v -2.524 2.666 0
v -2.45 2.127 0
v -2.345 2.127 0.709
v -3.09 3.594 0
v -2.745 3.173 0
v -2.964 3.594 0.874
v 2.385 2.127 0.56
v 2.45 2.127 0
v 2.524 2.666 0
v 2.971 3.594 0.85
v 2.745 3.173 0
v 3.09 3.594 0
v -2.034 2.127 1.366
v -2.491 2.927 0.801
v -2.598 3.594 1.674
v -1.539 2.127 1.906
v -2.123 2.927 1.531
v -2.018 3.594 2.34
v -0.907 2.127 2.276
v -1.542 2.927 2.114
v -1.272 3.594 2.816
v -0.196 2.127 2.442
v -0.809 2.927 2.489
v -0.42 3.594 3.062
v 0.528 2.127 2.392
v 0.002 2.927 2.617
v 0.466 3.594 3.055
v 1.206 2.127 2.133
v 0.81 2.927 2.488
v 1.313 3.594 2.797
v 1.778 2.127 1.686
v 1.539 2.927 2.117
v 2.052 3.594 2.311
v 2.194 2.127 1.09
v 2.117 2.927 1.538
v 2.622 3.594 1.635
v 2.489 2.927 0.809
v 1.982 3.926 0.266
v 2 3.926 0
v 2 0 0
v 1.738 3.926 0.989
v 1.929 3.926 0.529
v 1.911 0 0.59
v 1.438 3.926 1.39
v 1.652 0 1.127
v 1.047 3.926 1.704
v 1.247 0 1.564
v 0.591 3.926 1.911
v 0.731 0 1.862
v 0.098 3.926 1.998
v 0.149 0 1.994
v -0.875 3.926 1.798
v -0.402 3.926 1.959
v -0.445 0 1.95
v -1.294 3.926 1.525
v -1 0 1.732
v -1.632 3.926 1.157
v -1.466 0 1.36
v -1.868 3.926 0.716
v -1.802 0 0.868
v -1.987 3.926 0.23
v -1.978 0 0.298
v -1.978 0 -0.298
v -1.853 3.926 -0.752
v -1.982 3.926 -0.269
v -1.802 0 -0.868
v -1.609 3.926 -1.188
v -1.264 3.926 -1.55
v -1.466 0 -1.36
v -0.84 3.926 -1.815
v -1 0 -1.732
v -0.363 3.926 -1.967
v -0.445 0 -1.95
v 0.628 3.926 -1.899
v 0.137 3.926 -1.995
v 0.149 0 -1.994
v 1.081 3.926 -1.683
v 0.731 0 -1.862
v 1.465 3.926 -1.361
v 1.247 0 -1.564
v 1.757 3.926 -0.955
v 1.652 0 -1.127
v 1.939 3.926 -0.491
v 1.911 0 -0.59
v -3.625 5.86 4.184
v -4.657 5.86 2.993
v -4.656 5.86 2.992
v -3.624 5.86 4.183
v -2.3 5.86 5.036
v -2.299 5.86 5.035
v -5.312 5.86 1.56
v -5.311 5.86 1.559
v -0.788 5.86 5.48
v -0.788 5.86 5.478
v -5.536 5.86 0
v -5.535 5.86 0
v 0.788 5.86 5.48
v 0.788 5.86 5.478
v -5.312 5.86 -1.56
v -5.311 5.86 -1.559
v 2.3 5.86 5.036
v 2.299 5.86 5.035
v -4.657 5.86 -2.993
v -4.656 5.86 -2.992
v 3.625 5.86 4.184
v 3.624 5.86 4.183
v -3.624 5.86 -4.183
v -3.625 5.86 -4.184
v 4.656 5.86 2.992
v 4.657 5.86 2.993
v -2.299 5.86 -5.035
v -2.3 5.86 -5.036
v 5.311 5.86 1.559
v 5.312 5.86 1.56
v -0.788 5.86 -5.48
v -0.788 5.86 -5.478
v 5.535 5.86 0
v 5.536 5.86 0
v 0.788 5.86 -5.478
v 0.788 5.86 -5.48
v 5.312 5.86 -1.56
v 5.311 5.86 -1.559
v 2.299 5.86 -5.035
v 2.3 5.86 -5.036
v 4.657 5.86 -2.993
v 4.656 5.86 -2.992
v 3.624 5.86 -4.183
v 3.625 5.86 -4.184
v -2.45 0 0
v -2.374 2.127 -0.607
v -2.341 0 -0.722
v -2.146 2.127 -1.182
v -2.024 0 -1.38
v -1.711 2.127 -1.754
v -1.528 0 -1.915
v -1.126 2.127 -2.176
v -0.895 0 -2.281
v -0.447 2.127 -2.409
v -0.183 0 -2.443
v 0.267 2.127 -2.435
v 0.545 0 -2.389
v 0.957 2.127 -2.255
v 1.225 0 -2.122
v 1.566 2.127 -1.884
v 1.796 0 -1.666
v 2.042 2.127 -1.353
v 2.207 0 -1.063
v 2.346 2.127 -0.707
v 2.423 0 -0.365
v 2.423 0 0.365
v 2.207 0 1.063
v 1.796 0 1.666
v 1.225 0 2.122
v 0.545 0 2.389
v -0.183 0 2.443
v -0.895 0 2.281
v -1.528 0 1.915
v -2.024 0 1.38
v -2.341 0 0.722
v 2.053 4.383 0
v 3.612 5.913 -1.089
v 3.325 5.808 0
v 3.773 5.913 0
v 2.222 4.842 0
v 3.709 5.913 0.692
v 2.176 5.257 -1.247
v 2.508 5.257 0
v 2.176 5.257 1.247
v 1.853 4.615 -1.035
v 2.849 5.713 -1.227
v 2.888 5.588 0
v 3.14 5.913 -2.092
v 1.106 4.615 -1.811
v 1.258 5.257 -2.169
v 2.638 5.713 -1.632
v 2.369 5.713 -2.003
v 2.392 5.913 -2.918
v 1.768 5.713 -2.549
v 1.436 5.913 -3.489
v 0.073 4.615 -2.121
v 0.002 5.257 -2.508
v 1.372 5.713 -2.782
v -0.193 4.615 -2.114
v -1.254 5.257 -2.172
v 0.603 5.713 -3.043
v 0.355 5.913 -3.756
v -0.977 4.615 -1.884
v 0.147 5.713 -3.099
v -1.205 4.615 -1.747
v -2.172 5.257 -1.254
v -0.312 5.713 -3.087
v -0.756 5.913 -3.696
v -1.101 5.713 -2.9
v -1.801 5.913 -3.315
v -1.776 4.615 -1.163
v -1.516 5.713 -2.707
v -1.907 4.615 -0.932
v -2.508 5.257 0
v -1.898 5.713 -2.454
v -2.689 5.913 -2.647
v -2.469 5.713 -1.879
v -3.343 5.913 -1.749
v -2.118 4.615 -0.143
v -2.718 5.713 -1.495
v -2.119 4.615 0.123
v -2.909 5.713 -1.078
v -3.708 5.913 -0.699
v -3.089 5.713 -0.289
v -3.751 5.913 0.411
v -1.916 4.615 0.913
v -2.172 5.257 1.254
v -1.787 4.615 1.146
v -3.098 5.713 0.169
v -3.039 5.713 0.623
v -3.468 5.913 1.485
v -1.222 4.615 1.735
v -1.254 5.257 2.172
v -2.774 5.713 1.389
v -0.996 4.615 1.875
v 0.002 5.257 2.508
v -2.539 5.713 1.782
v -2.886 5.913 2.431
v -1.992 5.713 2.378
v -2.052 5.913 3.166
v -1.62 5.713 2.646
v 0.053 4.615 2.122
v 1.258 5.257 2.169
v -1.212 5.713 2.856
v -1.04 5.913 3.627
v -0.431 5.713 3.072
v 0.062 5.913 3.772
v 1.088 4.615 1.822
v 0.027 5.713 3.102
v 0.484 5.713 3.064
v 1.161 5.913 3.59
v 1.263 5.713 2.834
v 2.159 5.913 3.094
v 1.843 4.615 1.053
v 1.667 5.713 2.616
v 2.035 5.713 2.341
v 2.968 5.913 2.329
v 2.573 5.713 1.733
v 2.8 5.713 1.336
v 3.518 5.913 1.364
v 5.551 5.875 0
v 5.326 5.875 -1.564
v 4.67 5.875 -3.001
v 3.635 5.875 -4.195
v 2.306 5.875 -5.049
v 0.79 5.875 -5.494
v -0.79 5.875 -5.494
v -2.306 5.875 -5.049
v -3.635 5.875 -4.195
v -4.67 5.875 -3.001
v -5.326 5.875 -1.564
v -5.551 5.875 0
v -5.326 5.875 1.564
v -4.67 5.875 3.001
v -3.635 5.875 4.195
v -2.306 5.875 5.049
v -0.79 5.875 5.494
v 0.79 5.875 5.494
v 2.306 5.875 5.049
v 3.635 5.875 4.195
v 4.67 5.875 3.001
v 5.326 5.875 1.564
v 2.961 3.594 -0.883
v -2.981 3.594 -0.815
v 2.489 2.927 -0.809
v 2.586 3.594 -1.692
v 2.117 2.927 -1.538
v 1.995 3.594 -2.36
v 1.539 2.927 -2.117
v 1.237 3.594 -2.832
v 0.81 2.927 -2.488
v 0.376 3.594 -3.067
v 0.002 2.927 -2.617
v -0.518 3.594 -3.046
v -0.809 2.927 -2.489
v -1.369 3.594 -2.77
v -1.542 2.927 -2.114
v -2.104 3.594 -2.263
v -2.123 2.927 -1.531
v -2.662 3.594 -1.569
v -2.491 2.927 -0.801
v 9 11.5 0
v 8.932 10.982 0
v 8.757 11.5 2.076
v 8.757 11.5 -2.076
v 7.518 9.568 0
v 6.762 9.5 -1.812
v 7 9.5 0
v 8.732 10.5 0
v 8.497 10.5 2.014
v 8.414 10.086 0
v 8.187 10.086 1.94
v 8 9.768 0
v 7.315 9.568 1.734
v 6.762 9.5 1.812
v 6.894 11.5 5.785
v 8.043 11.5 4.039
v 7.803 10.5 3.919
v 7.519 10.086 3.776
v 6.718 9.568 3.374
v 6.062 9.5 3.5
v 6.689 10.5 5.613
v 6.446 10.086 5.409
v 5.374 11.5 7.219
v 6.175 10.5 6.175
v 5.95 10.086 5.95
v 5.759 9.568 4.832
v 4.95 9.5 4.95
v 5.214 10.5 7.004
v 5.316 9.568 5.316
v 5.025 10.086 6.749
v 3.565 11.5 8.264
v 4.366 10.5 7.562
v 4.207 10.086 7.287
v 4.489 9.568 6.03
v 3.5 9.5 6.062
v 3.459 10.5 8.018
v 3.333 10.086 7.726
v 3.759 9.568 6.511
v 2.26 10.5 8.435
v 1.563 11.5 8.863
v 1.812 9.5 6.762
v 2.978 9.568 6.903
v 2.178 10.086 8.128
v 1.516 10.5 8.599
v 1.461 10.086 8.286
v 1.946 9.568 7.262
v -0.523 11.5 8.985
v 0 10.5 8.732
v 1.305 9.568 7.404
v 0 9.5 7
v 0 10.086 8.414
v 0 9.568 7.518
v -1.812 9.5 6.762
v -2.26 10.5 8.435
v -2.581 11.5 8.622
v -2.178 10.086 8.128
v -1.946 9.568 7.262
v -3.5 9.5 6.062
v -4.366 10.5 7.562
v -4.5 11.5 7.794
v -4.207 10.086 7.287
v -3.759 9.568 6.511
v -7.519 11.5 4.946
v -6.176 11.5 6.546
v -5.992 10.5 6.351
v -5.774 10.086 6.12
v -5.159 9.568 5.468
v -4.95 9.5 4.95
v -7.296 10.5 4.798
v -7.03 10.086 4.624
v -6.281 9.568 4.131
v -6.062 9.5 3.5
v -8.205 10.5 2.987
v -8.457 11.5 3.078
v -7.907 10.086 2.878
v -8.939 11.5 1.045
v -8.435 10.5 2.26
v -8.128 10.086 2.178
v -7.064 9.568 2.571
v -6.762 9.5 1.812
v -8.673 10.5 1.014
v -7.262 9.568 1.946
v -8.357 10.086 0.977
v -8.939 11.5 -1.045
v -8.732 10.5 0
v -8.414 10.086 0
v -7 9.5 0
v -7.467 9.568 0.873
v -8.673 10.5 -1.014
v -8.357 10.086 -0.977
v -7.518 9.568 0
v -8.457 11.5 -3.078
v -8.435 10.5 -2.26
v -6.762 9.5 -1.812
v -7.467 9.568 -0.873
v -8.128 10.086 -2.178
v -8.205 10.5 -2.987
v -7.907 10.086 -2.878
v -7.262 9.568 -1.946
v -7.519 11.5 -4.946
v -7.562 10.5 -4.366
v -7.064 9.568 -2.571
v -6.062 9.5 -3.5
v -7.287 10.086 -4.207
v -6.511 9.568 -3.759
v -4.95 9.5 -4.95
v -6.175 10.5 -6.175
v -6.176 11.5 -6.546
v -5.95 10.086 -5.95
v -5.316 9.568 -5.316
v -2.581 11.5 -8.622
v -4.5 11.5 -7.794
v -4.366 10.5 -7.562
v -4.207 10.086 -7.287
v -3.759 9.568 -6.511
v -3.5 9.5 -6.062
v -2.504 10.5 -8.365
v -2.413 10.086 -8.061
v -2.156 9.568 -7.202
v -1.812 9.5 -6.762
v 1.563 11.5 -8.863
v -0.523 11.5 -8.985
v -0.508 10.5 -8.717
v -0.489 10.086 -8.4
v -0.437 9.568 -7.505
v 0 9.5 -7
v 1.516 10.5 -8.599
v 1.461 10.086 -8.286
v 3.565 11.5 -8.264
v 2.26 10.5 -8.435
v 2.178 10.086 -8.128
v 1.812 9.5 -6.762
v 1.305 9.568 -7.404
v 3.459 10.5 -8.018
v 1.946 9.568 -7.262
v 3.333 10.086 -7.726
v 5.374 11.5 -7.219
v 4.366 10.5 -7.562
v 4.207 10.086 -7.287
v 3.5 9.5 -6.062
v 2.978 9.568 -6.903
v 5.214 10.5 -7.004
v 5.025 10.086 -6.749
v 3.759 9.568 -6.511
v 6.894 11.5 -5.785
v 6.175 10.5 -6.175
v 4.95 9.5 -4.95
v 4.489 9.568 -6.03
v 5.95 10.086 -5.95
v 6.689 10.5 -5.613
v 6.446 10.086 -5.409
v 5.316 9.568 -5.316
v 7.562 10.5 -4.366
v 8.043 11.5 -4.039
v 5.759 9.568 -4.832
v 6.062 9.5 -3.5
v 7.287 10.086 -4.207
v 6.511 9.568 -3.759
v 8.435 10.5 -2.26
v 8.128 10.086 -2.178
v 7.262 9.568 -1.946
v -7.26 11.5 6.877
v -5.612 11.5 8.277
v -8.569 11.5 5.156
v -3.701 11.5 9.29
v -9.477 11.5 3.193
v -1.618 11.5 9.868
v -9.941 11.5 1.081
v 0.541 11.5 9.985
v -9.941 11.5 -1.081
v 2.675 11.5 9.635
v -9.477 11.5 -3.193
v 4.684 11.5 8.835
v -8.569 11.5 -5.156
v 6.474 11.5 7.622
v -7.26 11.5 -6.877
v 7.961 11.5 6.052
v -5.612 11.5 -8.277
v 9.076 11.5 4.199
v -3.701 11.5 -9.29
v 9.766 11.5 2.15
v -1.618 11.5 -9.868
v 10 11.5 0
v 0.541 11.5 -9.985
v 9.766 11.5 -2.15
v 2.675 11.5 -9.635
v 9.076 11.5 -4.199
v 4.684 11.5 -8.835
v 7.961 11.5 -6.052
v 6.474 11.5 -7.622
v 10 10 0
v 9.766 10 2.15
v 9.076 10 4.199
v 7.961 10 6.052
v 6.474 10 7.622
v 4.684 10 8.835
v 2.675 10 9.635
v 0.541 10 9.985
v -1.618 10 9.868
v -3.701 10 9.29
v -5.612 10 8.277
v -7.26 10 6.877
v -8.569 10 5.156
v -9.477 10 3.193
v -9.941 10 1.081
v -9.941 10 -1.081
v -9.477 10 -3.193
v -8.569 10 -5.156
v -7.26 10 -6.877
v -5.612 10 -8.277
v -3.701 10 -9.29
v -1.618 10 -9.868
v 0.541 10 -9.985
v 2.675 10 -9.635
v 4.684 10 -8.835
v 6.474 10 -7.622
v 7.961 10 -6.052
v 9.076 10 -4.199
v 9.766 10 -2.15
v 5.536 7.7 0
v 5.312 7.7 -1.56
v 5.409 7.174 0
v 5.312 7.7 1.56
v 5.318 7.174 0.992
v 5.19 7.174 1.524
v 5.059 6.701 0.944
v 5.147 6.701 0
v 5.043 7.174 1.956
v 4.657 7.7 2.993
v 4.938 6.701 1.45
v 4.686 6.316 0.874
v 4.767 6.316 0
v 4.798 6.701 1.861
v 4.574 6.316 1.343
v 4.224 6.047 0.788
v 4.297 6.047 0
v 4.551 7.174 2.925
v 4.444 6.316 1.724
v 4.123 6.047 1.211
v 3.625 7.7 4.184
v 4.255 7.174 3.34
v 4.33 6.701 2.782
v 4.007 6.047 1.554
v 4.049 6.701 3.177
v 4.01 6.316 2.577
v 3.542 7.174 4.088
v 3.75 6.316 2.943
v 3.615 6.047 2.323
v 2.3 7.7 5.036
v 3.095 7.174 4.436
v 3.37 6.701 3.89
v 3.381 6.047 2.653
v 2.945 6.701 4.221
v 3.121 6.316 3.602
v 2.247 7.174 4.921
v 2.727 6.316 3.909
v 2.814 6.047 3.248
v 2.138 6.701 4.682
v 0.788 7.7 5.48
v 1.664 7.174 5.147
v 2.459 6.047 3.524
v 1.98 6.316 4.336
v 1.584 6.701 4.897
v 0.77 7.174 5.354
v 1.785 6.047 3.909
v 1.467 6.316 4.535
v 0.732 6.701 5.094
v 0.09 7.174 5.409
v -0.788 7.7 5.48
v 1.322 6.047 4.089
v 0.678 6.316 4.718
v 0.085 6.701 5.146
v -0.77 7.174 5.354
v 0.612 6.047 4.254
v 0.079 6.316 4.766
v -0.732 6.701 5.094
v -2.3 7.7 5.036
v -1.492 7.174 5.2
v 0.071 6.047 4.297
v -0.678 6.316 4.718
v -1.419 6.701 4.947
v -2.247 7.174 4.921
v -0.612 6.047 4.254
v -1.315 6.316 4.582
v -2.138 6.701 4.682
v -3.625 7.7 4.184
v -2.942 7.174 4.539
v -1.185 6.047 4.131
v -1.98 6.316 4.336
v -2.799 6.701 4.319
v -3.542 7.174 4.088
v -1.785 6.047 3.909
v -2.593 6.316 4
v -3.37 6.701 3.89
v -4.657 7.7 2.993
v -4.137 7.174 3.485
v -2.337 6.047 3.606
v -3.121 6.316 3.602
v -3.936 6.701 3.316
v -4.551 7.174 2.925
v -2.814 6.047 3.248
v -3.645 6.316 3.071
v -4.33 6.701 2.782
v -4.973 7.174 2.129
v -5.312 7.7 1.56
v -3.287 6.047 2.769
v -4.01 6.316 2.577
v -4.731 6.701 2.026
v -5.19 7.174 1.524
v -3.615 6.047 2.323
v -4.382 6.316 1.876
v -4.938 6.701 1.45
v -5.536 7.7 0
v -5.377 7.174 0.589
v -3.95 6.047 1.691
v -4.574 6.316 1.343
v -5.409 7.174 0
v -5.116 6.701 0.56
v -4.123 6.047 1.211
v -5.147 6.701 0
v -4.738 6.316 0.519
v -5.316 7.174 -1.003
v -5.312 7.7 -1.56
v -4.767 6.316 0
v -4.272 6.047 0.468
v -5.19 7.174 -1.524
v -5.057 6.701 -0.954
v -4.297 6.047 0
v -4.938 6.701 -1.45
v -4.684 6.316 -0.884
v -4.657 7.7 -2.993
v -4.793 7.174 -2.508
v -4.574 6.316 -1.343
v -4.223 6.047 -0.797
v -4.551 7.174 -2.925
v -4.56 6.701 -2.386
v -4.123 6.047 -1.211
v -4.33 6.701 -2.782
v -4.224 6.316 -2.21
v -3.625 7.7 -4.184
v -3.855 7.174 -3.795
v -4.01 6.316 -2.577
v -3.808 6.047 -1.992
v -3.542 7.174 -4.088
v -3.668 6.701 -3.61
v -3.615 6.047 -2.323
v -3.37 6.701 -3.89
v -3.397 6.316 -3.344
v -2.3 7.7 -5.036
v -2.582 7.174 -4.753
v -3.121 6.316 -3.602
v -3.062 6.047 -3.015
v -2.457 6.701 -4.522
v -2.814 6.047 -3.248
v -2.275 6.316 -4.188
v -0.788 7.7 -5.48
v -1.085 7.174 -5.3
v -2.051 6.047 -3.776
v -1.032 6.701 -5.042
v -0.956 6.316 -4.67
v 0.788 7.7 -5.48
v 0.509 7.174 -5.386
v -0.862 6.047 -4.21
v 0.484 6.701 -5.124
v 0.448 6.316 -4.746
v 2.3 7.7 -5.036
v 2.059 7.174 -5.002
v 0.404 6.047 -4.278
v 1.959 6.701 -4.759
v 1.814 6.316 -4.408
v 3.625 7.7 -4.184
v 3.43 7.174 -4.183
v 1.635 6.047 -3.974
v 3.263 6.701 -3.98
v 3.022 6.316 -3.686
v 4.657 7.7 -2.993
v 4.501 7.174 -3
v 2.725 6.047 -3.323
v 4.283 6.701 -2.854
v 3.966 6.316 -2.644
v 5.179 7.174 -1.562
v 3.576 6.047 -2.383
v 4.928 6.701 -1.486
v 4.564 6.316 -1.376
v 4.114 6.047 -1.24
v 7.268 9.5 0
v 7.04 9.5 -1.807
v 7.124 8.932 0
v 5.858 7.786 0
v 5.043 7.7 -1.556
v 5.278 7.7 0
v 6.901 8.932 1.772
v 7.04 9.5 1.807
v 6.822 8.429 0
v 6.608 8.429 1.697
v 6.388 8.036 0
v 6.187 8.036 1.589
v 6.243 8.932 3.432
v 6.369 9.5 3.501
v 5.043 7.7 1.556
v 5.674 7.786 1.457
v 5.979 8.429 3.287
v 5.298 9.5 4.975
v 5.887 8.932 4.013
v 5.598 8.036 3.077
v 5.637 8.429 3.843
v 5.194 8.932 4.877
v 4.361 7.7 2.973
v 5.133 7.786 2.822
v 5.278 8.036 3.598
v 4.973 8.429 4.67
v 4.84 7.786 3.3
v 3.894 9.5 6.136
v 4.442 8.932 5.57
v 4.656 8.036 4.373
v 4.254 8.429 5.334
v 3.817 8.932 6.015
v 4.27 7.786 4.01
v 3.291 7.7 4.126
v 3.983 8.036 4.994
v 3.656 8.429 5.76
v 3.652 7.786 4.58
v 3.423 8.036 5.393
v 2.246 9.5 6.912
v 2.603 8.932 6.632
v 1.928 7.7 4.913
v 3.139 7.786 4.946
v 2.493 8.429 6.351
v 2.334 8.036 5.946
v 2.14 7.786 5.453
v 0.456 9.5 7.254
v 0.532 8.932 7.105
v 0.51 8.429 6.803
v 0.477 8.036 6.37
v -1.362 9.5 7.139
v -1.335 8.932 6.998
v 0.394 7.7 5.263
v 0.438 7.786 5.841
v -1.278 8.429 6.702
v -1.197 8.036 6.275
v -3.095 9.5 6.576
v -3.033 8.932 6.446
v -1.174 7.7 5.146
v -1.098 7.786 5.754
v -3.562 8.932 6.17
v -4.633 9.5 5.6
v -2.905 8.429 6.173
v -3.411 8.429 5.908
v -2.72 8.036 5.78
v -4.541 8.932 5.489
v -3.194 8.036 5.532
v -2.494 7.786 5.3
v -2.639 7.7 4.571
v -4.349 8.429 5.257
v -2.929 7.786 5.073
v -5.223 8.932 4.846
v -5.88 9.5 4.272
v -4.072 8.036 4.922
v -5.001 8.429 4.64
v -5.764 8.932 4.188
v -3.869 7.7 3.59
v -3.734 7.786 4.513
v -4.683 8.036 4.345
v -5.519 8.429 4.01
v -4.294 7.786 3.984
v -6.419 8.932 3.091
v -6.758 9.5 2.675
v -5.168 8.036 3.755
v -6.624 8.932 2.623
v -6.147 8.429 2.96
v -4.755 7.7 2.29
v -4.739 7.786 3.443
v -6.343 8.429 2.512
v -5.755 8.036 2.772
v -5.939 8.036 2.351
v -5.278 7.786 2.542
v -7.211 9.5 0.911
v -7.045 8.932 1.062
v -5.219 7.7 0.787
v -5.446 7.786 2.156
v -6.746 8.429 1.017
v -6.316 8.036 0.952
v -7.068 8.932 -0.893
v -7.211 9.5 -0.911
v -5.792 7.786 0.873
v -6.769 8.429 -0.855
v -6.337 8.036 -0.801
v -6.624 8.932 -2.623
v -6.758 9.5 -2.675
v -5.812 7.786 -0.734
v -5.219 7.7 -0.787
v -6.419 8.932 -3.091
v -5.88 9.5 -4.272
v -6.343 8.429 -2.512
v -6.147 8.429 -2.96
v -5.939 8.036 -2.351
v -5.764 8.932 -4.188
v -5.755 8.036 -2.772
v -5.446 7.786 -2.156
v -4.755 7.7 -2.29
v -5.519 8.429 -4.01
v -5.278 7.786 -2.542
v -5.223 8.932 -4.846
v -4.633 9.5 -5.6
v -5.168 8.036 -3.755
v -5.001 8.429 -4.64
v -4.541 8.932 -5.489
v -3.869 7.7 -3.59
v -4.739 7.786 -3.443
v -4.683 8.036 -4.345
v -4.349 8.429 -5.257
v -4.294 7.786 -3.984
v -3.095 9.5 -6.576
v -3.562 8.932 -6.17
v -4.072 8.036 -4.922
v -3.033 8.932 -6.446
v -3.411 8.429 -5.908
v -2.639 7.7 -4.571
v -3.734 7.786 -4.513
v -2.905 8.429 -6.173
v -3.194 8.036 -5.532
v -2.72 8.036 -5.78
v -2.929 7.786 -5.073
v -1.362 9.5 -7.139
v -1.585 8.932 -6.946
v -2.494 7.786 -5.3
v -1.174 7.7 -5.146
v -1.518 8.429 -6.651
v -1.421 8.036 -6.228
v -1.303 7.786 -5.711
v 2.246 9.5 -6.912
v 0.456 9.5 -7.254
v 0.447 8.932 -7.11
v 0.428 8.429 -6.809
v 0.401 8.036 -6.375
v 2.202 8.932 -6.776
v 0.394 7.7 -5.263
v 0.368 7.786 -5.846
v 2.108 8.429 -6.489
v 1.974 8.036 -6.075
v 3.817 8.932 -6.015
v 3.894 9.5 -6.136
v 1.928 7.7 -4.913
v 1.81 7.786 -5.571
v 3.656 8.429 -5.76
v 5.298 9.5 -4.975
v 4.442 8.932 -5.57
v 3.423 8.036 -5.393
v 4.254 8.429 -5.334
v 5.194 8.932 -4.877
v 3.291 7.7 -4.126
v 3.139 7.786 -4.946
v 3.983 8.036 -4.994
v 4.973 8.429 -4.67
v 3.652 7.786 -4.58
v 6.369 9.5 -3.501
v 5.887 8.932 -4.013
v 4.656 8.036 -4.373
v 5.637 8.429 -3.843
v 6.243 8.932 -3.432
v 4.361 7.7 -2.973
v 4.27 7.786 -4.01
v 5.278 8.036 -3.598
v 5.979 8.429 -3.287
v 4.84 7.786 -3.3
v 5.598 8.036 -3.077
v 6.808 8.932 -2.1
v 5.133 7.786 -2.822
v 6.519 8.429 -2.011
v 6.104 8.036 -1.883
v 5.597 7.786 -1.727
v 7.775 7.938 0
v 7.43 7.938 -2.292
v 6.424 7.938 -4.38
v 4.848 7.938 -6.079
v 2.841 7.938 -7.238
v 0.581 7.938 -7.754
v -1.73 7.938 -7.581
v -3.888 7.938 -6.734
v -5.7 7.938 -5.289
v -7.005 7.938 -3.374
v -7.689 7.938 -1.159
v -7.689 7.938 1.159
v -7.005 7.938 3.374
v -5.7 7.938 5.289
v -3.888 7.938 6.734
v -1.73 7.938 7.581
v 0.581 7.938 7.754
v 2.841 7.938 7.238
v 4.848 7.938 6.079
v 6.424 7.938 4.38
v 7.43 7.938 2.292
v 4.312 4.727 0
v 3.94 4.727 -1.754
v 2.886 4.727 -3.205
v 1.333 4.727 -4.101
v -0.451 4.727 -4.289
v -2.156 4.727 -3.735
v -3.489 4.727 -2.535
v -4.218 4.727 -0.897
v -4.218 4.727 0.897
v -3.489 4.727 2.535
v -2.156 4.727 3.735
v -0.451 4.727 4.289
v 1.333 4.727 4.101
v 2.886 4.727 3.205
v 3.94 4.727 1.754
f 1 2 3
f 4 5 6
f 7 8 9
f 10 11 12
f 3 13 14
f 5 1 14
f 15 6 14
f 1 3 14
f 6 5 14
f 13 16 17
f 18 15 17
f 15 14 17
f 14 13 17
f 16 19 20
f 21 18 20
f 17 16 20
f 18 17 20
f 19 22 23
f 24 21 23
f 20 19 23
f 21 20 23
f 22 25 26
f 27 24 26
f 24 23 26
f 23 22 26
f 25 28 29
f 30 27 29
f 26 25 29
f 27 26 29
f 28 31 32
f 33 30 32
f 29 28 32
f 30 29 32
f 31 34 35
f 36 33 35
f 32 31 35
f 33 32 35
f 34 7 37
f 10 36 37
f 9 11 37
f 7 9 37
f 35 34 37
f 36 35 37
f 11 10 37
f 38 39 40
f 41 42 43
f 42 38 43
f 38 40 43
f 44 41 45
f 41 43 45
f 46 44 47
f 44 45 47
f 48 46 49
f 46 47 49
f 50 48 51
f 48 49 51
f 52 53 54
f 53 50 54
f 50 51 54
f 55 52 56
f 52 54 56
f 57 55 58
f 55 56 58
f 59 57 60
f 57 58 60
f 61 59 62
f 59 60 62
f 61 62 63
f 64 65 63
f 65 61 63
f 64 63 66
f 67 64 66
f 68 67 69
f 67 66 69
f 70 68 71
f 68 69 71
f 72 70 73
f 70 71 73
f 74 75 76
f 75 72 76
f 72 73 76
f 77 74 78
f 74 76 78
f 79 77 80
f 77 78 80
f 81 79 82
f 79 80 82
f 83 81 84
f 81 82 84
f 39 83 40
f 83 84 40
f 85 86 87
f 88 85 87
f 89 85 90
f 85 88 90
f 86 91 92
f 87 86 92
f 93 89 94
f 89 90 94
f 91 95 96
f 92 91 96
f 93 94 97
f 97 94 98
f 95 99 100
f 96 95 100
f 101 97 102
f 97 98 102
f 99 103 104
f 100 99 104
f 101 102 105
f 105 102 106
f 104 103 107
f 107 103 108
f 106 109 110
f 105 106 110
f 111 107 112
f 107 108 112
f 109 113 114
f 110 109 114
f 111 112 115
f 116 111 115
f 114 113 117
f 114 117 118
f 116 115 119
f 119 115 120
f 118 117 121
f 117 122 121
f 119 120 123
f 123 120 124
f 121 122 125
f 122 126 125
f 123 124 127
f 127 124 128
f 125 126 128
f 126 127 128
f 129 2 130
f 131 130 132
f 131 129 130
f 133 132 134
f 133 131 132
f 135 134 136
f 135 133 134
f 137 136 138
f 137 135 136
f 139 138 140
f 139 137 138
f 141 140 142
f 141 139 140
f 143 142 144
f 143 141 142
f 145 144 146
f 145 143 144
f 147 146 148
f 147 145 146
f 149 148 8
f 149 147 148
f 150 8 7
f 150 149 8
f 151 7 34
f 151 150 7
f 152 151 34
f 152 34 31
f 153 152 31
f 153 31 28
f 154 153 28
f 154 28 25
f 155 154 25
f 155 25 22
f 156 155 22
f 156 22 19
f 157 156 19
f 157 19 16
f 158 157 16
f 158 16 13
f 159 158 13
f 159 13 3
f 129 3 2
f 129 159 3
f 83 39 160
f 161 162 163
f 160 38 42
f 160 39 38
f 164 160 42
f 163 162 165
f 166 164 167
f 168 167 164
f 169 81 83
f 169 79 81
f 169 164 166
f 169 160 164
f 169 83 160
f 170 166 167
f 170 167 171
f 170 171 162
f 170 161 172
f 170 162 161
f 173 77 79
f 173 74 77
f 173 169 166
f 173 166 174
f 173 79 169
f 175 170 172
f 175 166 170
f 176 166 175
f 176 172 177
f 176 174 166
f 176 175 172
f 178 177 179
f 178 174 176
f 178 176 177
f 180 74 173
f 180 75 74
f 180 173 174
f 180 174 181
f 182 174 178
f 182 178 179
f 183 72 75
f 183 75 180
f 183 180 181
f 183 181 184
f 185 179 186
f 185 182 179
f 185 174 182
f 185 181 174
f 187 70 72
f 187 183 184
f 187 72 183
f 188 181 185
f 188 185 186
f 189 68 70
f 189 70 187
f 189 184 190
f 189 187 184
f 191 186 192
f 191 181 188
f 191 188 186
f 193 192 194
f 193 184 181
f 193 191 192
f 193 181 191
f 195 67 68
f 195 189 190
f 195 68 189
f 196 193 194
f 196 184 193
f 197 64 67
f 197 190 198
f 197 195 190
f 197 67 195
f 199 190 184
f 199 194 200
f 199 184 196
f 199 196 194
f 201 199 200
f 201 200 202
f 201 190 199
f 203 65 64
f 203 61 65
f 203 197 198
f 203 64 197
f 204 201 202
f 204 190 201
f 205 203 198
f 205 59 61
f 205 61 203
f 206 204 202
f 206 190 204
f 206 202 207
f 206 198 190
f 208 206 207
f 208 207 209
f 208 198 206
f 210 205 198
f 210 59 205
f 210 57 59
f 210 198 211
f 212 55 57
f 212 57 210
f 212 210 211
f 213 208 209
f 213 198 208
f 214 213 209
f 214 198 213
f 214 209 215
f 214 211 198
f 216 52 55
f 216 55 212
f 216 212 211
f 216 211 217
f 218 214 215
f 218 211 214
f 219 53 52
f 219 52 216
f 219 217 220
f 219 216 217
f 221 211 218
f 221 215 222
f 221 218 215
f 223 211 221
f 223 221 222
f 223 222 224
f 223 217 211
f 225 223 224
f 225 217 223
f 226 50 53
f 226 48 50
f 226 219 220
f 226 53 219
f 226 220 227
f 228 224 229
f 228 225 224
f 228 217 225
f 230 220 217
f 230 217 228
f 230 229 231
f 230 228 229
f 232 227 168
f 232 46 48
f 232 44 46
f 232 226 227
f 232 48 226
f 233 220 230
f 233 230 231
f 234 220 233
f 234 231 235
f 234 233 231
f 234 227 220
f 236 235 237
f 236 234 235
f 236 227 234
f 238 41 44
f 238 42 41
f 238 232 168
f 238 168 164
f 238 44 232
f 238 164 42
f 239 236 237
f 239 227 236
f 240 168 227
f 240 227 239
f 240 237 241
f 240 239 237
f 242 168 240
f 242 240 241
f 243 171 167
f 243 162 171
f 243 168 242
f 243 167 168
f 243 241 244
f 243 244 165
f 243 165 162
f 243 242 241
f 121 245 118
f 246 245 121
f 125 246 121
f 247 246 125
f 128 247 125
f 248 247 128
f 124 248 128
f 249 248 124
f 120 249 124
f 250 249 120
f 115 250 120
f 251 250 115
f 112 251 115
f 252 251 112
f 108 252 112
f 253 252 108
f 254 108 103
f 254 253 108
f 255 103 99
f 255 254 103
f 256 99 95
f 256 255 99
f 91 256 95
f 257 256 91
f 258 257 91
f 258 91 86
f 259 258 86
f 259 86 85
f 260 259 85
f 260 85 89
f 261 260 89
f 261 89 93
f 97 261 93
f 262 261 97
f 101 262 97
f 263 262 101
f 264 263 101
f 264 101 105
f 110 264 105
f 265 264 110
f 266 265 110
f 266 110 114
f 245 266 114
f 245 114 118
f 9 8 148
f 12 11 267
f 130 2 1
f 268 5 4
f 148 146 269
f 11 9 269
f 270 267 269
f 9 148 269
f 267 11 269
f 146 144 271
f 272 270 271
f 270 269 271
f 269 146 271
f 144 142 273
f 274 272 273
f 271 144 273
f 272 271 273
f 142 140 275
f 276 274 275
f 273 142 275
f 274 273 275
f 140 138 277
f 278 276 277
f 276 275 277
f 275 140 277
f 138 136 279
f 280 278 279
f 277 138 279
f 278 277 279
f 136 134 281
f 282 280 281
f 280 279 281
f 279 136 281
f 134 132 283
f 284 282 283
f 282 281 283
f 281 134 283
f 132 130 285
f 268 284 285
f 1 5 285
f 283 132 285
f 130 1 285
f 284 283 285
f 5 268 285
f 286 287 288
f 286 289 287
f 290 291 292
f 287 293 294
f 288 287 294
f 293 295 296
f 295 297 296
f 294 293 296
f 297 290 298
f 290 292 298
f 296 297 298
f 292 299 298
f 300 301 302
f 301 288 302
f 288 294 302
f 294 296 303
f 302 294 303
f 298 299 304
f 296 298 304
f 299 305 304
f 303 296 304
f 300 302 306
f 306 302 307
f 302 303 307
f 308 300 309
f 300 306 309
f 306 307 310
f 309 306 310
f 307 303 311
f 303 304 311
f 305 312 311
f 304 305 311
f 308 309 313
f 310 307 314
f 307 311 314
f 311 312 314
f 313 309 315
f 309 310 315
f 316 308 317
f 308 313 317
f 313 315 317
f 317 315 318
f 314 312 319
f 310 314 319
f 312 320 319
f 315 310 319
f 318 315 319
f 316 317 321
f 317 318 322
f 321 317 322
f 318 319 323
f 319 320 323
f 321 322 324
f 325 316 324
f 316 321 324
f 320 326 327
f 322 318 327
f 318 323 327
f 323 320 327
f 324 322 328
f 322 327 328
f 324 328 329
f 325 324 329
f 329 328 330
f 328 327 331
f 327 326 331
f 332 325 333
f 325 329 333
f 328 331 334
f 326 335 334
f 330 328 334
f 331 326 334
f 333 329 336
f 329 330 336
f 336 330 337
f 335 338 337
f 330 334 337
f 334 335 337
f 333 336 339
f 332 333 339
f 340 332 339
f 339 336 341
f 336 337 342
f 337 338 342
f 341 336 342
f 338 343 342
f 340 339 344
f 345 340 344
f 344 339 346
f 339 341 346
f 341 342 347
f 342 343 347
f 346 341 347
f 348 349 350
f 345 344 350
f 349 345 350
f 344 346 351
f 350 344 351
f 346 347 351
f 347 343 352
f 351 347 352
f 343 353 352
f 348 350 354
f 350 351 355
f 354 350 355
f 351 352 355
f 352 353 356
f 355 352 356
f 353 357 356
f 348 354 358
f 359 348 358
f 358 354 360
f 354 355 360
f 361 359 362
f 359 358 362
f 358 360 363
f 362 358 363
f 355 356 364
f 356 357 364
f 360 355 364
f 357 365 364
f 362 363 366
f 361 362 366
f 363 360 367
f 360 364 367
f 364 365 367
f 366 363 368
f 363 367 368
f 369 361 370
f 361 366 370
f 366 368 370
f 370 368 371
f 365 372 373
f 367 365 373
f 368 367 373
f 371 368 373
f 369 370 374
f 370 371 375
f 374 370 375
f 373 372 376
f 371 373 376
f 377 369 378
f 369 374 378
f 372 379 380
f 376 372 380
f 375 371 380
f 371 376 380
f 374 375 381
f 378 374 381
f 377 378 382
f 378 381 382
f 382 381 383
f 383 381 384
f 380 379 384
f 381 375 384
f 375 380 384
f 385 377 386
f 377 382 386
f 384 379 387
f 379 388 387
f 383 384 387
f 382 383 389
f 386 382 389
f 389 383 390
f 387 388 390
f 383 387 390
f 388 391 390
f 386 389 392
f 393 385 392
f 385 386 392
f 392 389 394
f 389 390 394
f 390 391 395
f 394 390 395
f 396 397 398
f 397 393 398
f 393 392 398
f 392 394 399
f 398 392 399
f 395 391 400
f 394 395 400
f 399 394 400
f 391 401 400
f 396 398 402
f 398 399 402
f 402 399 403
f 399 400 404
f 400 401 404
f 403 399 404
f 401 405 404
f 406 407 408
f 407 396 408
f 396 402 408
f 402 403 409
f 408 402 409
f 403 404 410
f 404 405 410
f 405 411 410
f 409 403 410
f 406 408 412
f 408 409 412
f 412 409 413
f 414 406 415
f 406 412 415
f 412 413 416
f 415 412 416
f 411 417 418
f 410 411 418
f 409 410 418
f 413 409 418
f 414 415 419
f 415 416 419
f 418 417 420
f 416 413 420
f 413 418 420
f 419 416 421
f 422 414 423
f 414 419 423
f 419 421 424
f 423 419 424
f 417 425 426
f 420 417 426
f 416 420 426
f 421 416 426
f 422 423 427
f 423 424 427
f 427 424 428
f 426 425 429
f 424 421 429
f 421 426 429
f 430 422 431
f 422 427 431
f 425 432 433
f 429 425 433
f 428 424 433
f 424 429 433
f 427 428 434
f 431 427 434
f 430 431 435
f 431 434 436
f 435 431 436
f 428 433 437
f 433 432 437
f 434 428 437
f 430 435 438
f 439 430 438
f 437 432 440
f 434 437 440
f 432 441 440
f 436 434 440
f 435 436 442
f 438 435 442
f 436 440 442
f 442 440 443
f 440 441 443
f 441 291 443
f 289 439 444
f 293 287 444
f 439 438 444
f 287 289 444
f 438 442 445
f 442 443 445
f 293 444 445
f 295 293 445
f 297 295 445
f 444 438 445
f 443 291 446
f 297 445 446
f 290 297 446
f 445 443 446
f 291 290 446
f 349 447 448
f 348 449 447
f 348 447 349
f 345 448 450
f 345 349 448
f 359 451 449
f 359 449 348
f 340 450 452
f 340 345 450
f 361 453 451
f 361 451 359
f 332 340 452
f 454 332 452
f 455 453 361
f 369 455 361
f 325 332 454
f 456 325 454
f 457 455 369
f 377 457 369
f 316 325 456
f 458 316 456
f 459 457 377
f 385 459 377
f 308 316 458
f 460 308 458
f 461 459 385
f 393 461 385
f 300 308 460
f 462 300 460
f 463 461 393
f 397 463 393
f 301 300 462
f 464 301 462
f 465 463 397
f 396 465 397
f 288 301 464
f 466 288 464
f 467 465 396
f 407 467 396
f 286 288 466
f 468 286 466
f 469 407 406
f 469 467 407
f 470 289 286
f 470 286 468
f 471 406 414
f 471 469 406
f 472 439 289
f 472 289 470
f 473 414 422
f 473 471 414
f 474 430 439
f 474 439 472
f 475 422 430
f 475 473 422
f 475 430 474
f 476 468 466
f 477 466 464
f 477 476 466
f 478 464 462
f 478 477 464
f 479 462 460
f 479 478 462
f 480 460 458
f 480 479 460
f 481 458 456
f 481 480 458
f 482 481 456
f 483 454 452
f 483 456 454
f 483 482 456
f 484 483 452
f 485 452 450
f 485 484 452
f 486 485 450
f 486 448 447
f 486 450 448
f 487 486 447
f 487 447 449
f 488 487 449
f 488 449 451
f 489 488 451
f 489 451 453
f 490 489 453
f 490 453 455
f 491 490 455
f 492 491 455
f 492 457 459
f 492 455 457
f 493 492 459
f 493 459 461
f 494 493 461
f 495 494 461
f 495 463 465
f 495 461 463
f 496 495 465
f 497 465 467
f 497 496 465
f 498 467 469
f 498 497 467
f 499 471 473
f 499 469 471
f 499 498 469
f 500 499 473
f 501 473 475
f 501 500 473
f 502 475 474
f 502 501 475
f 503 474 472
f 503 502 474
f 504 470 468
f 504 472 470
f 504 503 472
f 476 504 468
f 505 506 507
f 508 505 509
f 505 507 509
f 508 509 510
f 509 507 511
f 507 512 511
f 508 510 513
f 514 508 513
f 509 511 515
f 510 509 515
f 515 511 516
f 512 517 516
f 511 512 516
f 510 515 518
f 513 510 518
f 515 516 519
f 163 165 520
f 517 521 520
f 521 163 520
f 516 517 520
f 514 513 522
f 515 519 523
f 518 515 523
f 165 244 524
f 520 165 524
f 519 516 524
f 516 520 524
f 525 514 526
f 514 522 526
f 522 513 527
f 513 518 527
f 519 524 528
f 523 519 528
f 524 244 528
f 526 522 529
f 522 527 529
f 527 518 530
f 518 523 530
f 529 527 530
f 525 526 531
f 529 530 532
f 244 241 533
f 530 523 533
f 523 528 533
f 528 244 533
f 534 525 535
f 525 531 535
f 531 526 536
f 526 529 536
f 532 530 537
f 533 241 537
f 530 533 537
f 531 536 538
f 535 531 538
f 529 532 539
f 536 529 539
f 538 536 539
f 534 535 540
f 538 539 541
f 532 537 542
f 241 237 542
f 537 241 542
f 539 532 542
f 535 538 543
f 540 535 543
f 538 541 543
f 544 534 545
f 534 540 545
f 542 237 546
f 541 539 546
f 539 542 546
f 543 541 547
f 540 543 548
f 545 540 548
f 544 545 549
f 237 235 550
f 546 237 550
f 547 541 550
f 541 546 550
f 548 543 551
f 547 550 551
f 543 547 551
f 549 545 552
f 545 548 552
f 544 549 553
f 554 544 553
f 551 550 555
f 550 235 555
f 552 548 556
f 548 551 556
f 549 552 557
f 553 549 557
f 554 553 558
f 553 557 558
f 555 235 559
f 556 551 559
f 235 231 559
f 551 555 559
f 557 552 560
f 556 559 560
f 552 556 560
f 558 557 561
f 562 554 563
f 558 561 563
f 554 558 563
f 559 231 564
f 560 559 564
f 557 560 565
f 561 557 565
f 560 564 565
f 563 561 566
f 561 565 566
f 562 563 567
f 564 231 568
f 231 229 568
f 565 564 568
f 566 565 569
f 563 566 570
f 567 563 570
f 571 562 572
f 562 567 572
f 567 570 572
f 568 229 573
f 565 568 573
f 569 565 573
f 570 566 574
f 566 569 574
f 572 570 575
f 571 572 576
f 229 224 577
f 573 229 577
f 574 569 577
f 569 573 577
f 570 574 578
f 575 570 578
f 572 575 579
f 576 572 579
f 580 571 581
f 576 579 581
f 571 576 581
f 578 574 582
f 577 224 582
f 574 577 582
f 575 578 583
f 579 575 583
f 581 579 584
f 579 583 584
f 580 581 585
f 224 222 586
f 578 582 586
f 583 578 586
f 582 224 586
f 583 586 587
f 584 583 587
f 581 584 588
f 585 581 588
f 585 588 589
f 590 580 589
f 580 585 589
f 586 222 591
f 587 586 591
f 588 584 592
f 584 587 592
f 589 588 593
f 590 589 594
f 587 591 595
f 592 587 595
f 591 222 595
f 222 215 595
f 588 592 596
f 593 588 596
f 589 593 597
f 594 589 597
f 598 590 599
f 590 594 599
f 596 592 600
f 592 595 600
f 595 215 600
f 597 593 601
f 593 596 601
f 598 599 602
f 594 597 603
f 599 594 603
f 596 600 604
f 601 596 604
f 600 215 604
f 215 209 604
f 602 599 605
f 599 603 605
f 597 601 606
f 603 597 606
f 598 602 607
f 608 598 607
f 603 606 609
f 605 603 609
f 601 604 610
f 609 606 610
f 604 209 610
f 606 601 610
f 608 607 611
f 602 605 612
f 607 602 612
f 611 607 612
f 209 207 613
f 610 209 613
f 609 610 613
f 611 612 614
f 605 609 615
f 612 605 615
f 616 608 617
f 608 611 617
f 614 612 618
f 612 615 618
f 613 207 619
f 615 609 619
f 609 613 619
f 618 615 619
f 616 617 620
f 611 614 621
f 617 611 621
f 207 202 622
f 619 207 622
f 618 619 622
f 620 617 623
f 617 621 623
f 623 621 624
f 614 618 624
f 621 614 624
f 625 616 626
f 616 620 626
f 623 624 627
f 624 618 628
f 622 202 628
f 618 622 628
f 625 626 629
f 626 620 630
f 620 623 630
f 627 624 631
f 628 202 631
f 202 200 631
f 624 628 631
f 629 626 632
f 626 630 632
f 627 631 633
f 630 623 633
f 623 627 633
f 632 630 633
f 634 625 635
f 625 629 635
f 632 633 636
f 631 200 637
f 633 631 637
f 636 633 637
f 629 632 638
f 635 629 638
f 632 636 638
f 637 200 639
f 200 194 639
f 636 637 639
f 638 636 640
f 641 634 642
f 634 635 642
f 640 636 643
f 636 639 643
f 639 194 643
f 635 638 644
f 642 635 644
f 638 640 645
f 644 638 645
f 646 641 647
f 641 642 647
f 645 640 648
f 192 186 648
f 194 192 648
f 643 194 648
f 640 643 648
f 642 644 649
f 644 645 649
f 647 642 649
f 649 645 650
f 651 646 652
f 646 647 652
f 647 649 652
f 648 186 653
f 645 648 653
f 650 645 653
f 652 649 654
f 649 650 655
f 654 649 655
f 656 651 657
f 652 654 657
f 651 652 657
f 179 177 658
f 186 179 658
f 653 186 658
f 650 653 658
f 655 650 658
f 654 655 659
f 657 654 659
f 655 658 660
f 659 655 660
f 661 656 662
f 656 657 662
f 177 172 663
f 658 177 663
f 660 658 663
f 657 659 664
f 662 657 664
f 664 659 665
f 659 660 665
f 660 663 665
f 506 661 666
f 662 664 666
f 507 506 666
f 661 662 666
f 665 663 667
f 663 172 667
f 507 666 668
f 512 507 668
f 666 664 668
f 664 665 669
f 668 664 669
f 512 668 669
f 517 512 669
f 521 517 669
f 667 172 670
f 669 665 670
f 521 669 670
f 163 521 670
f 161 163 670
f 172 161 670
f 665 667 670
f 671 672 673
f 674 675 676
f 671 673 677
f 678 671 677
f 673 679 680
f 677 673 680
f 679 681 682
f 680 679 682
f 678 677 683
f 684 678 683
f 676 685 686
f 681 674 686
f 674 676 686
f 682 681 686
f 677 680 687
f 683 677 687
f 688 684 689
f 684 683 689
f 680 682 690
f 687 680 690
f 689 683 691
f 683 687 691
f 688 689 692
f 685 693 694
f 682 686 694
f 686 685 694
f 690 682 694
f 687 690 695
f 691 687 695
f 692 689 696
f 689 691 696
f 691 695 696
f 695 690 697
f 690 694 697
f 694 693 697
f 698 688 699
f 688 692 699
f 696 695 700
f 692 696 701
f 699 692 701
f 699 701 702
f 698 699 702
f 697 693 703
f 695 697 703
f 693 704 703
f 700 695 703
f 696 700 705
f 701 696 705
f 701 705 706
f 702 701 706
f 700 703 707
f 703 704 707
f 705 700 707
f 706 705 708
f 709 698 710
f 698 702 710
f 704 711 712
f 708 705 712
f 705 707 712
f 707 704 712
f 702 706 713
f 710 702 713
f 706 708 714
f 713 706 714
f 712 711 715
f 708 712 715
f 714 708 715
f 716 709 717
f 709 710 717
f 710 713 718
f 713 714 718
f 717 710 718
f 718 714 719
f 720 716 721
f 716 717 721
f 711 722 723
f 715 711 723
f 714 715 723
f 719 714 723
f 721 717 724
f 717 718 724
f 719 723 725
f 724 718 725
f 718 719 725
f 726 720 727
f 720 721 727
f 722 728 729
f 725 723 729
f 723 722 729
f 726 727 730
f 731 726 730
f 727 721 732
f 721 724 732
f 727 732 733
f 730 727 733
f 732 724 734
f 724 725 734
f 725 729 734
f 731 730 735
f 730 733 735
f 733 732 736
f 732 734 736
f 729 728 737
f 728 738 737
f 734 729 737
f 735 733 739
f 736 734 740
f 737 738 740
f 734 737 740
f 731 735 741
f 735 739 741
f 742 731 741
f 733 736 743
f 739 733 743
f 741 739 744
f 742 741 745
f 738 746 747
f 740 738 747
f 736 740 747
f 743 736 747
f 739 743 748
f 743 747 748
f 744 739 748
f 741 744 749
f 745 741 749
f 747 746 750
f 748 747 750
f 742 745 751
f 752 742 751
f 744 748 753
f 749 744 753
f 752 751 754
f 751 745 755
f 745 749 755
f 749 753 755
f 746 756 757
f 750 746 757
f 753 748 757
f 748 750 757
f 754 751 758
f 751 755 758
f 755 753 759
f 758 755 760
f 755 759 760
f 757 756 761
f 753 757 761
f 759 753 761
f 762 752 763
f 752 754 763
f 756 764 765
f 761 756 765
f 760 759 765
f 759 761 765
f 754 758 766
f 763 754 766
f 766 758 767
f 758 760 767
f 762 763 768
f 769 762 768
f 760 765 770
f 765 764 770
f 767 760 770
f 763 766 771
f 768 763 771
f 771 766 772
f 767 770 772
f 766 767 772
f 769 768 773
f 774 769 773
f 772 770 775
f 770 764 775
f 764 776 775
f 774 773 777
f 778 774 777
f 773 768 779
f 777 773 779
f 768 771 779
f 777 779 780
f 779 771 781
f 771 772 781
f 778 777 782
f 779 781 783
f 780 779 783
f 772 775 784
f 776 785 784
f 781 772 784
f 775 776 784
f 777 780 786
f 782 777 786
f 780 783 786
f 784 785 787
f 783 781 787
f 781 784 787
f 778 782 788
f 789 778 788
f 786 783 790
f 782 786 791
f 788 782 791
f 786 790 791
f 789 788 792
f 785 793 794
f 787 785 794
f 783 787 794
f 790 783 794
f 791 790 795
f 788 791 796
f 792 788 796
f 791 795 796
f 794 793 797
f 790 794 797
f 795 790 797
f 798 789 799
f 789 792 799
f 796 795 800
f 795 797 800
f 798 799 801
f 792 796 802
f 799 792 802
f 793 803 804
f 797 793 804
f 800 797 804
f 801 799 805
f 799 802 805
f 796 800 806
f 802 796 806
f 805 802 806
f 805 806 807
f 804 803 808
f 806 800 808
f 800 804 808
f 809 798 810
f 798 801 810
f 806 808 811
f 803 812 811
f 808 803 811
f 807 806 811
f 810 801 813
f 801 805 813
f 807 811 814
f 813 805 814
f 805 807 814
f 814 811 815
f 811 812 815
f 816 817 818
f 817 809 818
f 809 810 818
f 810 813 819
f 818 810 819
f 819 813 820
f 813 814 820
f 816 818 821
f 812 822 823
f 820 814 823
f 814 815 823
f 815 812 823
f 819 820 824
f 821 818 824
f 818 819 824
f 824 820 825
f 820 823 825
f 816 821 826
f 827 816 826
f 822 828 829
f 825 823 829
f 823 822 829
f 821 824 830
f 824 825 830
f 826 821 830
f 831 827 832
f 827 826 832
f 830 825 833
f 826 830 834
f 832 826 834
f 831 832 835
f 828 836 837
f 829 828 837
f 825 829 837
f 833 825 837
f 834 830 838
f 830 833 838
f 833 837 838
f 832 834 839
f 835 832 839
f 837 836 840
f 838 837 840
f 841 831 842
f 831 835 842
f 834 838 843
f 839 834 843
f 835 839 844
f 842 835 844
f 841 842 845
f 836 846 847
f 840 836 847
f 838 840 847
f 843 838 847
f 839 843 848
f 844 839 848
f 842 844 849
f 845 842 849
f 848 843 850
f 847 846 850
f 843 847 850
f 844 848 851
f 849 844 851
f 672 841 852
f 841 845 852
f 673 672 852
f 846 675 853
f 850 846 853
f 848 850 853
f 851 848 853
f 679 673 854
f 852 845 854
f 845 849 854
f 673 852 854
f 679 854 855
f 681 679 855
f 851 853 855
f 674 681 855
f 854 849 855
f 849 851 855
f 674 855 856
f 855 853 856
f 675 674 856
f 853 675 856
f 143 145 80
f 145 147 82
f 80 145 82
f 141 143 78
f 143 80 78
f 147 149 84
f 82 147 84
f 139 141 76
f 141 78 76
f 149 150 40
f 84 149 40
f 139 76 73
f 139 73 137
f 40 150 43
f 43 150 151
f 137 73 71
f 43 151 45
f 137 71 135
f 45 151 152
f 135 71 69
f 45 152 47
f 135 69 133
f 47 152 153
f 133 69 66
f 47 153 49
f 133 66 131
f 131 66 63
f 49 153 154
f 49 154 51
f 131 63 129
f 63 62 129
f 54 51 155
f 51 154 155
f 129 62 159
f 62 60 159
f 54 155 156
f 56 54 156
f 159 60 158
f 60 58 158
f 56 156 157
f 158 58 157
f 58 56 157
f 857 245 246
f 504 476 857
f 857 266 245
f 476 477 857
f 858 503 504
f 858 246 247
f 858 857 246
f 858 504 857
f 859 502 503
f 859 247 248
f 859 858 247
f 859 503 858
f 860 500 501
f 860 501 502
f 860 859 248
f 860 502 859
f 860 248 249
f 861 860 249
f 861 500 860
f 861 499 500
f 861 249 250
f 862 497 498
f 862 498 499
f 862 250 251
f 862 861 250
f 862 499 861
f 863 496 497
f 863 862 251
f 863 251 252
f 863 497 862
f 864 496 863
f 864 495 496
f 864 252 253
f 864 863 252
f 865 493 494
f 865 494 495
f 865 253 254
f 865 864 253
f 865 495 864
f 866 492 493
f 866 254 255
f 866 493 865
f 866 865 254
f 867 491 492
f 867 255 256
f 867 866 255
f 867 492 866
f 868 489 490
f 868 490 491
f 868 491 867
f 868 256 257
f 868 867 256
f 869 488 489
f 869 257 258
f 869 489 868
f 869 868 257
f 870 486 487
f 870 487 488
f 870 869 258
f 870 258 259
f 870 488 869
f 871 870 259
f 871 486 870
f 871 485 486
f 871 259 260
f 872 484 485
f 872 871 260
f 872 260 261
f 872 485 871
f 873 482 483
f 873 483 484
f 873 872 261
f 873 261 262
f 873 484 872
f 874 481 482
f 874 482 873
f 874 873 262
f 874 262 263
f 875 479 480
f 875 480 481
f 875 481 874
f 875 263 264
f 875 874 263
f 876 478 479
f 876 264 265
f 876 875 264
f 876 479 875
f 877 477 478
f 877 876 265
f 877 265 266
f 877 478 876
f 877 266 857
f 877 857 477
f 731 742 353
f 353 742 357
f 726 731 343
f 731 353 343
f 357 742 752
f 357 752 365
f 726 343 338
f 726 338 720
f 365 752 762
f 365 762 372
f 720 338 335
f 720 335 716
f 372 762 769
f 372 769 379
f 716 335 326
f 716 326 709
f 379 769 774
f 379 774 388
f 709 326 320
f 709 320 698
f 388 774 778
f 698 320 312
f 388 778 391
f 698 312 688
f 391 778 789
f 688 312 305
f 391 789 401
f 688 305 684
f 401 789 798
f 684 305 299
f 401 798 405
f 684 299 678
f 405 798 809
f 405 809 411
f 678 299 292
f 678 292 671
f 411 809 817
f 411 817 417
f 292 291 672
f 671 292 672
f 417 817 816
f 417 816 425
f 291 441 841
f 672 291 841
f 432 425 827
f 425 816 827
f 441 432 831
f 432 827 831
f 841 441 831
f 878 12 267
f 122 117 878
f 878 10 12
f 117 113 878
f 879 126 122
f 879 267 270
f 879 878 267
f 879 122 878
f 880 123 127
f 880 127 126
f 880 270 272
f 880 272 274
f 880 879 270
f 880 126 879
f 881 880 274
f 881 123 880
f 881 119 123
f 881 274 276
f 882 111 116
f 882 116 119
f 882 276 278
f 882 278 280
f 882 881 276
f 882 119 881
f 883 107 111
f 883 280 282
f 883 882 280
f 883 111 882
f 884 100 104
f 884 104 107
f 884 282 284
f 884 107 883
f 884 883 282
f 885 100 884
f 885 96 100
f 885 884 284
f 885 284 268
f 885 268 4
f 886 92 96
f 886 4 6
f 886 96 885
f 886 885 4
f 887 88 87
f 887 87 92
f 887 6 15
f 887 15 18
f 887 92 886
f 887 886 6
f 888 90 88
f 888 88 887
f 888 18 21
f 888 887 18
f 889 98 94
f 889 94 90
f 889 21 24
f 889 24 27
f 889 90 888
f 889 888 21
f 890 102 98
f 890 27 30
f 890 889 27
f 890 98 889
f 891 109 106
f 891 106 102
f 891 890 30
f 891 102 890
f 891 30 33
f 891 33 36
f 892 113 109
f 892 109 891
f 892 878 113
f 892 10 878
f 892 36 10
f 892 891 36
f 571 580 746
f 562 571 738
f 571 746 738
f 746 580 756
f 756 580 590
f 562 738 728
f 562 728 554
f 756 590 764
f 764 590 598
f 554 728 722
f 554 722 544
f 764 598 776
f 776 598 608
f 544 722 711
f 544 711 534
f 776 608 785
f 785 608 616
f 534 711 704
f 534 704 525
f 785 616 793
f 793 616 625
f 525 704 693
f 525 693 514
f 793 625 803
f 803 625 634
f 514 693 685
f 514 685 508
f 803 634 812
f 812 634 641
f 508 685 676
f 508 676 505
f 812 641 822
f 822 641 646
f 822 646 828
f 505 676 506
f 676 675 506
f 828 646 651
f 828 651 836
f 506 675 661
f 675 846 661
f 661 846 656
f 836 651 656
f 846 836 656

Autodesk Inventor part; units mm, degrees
ref_plane "YZ Plane" through (0, 0, 0) normal (1, 0, 0) x (0, 1, 0)
ref_plane "XZ Plane" through (0, 0, 0) normal (0, 1, 0) x (-1, 0, 0)
ref_plane "XY Plane" through (0, 0, 0) normal (0, 0, 1) x (1, 0, 0)
sketch "Эскиз1" plane through (0, 0, 0) normal (0, 1, 0) x (-1, 0, 0)
  circle A0 centre (0, 0) radius 2.45
  dimension "d0" = 4.9
extrude "Выдавливание1" add sketch "Эскиз1" along normal blind 3
ref_plane "РабПлоскость2" through (0, 10, 0) normal (0, 1, 0) x (1, 0, 0)
sketch "Эскиз2" plane through (0, 10, 0) normal (0, 1, 0) x (1, 0, 0)
  circle A0 centre (0, 0) radius 10
  dimension "d4" = 20
extrude "Выдавливание2" add sketch "Эскиз2" along normal blind 1.5
loft "Лофт1" add section 1 edges at (-10, 10, 0) section 2 edges at (2.45, 3, 0)
sketch "Эскиз3" plane through (0, 0, 0) normal (0, -1, 0) x (1, 0, 0)
  circle A0 centre (0, 0) radius 2.45 projected
  circle A1 centre (0, 0) radius 2
  dimension "d11" = 4
sketch "Эскиз4" plane through (0, 0, 0) normal (0, -1, 0) x (1, 0, 0)
  point P0 (0, 0)
extrude "Выдавливание3" cut sketch "Эскиз3" against normal blind 3 contours A1
sketch "Эскиз5" plane through (0, 11.5, 0) normal (0, 1, 0) x (1, 0, 0)
  circle A0 centre (0, 0) radius 9
  dimension "d14" = 18
extrude "Выдавливание4" cut sketch "Эскиз5" against normal blind 2
fillet "Сопряжение1" radius 2 3 edges at (-9, 9.5, 0) (0, 3, -2.45) (0, 3, 2.45)
sketch "Эскиз6" plane through (0, 9.5, 0) normal (0, 1, 0) x (1, 0, 0)
  circle A0 centre (0, 0) radius 7.2679
extrude "Выдавливание5" cut sketch "Эскиз6" against normal blind 1.8
fillet "Сопряжение2" radius 2 1 edges at (-7.2679, 7.7, 0)
sketch "Эскиз7" plane through (0, 7.7, 0) normal (0, 1, 0) x (1, 0, 0)
  circle A0 centre (0, 0) radius 5.5359
extrude "Выдавливание6" cut sketch "Эскиз7" against normal blind 1.8
fillet "Сопряжение3" radius 2 1 edges at (-5.5359, 5.9, 0)
sketch "Эскиз11" plane through (0, 5.9, 0) normal (0, 1, 0) x (1, 0, 0)
  circle A0 centre (0, 0) radius 2
extrude "Выдавливание10" cut sketch "Эскиз11" against normal blind 3.1
fillet "Сопряжение6" radius 2 1 edges at (-2, 5.9, 0)
properties part number "TubeExpander"
